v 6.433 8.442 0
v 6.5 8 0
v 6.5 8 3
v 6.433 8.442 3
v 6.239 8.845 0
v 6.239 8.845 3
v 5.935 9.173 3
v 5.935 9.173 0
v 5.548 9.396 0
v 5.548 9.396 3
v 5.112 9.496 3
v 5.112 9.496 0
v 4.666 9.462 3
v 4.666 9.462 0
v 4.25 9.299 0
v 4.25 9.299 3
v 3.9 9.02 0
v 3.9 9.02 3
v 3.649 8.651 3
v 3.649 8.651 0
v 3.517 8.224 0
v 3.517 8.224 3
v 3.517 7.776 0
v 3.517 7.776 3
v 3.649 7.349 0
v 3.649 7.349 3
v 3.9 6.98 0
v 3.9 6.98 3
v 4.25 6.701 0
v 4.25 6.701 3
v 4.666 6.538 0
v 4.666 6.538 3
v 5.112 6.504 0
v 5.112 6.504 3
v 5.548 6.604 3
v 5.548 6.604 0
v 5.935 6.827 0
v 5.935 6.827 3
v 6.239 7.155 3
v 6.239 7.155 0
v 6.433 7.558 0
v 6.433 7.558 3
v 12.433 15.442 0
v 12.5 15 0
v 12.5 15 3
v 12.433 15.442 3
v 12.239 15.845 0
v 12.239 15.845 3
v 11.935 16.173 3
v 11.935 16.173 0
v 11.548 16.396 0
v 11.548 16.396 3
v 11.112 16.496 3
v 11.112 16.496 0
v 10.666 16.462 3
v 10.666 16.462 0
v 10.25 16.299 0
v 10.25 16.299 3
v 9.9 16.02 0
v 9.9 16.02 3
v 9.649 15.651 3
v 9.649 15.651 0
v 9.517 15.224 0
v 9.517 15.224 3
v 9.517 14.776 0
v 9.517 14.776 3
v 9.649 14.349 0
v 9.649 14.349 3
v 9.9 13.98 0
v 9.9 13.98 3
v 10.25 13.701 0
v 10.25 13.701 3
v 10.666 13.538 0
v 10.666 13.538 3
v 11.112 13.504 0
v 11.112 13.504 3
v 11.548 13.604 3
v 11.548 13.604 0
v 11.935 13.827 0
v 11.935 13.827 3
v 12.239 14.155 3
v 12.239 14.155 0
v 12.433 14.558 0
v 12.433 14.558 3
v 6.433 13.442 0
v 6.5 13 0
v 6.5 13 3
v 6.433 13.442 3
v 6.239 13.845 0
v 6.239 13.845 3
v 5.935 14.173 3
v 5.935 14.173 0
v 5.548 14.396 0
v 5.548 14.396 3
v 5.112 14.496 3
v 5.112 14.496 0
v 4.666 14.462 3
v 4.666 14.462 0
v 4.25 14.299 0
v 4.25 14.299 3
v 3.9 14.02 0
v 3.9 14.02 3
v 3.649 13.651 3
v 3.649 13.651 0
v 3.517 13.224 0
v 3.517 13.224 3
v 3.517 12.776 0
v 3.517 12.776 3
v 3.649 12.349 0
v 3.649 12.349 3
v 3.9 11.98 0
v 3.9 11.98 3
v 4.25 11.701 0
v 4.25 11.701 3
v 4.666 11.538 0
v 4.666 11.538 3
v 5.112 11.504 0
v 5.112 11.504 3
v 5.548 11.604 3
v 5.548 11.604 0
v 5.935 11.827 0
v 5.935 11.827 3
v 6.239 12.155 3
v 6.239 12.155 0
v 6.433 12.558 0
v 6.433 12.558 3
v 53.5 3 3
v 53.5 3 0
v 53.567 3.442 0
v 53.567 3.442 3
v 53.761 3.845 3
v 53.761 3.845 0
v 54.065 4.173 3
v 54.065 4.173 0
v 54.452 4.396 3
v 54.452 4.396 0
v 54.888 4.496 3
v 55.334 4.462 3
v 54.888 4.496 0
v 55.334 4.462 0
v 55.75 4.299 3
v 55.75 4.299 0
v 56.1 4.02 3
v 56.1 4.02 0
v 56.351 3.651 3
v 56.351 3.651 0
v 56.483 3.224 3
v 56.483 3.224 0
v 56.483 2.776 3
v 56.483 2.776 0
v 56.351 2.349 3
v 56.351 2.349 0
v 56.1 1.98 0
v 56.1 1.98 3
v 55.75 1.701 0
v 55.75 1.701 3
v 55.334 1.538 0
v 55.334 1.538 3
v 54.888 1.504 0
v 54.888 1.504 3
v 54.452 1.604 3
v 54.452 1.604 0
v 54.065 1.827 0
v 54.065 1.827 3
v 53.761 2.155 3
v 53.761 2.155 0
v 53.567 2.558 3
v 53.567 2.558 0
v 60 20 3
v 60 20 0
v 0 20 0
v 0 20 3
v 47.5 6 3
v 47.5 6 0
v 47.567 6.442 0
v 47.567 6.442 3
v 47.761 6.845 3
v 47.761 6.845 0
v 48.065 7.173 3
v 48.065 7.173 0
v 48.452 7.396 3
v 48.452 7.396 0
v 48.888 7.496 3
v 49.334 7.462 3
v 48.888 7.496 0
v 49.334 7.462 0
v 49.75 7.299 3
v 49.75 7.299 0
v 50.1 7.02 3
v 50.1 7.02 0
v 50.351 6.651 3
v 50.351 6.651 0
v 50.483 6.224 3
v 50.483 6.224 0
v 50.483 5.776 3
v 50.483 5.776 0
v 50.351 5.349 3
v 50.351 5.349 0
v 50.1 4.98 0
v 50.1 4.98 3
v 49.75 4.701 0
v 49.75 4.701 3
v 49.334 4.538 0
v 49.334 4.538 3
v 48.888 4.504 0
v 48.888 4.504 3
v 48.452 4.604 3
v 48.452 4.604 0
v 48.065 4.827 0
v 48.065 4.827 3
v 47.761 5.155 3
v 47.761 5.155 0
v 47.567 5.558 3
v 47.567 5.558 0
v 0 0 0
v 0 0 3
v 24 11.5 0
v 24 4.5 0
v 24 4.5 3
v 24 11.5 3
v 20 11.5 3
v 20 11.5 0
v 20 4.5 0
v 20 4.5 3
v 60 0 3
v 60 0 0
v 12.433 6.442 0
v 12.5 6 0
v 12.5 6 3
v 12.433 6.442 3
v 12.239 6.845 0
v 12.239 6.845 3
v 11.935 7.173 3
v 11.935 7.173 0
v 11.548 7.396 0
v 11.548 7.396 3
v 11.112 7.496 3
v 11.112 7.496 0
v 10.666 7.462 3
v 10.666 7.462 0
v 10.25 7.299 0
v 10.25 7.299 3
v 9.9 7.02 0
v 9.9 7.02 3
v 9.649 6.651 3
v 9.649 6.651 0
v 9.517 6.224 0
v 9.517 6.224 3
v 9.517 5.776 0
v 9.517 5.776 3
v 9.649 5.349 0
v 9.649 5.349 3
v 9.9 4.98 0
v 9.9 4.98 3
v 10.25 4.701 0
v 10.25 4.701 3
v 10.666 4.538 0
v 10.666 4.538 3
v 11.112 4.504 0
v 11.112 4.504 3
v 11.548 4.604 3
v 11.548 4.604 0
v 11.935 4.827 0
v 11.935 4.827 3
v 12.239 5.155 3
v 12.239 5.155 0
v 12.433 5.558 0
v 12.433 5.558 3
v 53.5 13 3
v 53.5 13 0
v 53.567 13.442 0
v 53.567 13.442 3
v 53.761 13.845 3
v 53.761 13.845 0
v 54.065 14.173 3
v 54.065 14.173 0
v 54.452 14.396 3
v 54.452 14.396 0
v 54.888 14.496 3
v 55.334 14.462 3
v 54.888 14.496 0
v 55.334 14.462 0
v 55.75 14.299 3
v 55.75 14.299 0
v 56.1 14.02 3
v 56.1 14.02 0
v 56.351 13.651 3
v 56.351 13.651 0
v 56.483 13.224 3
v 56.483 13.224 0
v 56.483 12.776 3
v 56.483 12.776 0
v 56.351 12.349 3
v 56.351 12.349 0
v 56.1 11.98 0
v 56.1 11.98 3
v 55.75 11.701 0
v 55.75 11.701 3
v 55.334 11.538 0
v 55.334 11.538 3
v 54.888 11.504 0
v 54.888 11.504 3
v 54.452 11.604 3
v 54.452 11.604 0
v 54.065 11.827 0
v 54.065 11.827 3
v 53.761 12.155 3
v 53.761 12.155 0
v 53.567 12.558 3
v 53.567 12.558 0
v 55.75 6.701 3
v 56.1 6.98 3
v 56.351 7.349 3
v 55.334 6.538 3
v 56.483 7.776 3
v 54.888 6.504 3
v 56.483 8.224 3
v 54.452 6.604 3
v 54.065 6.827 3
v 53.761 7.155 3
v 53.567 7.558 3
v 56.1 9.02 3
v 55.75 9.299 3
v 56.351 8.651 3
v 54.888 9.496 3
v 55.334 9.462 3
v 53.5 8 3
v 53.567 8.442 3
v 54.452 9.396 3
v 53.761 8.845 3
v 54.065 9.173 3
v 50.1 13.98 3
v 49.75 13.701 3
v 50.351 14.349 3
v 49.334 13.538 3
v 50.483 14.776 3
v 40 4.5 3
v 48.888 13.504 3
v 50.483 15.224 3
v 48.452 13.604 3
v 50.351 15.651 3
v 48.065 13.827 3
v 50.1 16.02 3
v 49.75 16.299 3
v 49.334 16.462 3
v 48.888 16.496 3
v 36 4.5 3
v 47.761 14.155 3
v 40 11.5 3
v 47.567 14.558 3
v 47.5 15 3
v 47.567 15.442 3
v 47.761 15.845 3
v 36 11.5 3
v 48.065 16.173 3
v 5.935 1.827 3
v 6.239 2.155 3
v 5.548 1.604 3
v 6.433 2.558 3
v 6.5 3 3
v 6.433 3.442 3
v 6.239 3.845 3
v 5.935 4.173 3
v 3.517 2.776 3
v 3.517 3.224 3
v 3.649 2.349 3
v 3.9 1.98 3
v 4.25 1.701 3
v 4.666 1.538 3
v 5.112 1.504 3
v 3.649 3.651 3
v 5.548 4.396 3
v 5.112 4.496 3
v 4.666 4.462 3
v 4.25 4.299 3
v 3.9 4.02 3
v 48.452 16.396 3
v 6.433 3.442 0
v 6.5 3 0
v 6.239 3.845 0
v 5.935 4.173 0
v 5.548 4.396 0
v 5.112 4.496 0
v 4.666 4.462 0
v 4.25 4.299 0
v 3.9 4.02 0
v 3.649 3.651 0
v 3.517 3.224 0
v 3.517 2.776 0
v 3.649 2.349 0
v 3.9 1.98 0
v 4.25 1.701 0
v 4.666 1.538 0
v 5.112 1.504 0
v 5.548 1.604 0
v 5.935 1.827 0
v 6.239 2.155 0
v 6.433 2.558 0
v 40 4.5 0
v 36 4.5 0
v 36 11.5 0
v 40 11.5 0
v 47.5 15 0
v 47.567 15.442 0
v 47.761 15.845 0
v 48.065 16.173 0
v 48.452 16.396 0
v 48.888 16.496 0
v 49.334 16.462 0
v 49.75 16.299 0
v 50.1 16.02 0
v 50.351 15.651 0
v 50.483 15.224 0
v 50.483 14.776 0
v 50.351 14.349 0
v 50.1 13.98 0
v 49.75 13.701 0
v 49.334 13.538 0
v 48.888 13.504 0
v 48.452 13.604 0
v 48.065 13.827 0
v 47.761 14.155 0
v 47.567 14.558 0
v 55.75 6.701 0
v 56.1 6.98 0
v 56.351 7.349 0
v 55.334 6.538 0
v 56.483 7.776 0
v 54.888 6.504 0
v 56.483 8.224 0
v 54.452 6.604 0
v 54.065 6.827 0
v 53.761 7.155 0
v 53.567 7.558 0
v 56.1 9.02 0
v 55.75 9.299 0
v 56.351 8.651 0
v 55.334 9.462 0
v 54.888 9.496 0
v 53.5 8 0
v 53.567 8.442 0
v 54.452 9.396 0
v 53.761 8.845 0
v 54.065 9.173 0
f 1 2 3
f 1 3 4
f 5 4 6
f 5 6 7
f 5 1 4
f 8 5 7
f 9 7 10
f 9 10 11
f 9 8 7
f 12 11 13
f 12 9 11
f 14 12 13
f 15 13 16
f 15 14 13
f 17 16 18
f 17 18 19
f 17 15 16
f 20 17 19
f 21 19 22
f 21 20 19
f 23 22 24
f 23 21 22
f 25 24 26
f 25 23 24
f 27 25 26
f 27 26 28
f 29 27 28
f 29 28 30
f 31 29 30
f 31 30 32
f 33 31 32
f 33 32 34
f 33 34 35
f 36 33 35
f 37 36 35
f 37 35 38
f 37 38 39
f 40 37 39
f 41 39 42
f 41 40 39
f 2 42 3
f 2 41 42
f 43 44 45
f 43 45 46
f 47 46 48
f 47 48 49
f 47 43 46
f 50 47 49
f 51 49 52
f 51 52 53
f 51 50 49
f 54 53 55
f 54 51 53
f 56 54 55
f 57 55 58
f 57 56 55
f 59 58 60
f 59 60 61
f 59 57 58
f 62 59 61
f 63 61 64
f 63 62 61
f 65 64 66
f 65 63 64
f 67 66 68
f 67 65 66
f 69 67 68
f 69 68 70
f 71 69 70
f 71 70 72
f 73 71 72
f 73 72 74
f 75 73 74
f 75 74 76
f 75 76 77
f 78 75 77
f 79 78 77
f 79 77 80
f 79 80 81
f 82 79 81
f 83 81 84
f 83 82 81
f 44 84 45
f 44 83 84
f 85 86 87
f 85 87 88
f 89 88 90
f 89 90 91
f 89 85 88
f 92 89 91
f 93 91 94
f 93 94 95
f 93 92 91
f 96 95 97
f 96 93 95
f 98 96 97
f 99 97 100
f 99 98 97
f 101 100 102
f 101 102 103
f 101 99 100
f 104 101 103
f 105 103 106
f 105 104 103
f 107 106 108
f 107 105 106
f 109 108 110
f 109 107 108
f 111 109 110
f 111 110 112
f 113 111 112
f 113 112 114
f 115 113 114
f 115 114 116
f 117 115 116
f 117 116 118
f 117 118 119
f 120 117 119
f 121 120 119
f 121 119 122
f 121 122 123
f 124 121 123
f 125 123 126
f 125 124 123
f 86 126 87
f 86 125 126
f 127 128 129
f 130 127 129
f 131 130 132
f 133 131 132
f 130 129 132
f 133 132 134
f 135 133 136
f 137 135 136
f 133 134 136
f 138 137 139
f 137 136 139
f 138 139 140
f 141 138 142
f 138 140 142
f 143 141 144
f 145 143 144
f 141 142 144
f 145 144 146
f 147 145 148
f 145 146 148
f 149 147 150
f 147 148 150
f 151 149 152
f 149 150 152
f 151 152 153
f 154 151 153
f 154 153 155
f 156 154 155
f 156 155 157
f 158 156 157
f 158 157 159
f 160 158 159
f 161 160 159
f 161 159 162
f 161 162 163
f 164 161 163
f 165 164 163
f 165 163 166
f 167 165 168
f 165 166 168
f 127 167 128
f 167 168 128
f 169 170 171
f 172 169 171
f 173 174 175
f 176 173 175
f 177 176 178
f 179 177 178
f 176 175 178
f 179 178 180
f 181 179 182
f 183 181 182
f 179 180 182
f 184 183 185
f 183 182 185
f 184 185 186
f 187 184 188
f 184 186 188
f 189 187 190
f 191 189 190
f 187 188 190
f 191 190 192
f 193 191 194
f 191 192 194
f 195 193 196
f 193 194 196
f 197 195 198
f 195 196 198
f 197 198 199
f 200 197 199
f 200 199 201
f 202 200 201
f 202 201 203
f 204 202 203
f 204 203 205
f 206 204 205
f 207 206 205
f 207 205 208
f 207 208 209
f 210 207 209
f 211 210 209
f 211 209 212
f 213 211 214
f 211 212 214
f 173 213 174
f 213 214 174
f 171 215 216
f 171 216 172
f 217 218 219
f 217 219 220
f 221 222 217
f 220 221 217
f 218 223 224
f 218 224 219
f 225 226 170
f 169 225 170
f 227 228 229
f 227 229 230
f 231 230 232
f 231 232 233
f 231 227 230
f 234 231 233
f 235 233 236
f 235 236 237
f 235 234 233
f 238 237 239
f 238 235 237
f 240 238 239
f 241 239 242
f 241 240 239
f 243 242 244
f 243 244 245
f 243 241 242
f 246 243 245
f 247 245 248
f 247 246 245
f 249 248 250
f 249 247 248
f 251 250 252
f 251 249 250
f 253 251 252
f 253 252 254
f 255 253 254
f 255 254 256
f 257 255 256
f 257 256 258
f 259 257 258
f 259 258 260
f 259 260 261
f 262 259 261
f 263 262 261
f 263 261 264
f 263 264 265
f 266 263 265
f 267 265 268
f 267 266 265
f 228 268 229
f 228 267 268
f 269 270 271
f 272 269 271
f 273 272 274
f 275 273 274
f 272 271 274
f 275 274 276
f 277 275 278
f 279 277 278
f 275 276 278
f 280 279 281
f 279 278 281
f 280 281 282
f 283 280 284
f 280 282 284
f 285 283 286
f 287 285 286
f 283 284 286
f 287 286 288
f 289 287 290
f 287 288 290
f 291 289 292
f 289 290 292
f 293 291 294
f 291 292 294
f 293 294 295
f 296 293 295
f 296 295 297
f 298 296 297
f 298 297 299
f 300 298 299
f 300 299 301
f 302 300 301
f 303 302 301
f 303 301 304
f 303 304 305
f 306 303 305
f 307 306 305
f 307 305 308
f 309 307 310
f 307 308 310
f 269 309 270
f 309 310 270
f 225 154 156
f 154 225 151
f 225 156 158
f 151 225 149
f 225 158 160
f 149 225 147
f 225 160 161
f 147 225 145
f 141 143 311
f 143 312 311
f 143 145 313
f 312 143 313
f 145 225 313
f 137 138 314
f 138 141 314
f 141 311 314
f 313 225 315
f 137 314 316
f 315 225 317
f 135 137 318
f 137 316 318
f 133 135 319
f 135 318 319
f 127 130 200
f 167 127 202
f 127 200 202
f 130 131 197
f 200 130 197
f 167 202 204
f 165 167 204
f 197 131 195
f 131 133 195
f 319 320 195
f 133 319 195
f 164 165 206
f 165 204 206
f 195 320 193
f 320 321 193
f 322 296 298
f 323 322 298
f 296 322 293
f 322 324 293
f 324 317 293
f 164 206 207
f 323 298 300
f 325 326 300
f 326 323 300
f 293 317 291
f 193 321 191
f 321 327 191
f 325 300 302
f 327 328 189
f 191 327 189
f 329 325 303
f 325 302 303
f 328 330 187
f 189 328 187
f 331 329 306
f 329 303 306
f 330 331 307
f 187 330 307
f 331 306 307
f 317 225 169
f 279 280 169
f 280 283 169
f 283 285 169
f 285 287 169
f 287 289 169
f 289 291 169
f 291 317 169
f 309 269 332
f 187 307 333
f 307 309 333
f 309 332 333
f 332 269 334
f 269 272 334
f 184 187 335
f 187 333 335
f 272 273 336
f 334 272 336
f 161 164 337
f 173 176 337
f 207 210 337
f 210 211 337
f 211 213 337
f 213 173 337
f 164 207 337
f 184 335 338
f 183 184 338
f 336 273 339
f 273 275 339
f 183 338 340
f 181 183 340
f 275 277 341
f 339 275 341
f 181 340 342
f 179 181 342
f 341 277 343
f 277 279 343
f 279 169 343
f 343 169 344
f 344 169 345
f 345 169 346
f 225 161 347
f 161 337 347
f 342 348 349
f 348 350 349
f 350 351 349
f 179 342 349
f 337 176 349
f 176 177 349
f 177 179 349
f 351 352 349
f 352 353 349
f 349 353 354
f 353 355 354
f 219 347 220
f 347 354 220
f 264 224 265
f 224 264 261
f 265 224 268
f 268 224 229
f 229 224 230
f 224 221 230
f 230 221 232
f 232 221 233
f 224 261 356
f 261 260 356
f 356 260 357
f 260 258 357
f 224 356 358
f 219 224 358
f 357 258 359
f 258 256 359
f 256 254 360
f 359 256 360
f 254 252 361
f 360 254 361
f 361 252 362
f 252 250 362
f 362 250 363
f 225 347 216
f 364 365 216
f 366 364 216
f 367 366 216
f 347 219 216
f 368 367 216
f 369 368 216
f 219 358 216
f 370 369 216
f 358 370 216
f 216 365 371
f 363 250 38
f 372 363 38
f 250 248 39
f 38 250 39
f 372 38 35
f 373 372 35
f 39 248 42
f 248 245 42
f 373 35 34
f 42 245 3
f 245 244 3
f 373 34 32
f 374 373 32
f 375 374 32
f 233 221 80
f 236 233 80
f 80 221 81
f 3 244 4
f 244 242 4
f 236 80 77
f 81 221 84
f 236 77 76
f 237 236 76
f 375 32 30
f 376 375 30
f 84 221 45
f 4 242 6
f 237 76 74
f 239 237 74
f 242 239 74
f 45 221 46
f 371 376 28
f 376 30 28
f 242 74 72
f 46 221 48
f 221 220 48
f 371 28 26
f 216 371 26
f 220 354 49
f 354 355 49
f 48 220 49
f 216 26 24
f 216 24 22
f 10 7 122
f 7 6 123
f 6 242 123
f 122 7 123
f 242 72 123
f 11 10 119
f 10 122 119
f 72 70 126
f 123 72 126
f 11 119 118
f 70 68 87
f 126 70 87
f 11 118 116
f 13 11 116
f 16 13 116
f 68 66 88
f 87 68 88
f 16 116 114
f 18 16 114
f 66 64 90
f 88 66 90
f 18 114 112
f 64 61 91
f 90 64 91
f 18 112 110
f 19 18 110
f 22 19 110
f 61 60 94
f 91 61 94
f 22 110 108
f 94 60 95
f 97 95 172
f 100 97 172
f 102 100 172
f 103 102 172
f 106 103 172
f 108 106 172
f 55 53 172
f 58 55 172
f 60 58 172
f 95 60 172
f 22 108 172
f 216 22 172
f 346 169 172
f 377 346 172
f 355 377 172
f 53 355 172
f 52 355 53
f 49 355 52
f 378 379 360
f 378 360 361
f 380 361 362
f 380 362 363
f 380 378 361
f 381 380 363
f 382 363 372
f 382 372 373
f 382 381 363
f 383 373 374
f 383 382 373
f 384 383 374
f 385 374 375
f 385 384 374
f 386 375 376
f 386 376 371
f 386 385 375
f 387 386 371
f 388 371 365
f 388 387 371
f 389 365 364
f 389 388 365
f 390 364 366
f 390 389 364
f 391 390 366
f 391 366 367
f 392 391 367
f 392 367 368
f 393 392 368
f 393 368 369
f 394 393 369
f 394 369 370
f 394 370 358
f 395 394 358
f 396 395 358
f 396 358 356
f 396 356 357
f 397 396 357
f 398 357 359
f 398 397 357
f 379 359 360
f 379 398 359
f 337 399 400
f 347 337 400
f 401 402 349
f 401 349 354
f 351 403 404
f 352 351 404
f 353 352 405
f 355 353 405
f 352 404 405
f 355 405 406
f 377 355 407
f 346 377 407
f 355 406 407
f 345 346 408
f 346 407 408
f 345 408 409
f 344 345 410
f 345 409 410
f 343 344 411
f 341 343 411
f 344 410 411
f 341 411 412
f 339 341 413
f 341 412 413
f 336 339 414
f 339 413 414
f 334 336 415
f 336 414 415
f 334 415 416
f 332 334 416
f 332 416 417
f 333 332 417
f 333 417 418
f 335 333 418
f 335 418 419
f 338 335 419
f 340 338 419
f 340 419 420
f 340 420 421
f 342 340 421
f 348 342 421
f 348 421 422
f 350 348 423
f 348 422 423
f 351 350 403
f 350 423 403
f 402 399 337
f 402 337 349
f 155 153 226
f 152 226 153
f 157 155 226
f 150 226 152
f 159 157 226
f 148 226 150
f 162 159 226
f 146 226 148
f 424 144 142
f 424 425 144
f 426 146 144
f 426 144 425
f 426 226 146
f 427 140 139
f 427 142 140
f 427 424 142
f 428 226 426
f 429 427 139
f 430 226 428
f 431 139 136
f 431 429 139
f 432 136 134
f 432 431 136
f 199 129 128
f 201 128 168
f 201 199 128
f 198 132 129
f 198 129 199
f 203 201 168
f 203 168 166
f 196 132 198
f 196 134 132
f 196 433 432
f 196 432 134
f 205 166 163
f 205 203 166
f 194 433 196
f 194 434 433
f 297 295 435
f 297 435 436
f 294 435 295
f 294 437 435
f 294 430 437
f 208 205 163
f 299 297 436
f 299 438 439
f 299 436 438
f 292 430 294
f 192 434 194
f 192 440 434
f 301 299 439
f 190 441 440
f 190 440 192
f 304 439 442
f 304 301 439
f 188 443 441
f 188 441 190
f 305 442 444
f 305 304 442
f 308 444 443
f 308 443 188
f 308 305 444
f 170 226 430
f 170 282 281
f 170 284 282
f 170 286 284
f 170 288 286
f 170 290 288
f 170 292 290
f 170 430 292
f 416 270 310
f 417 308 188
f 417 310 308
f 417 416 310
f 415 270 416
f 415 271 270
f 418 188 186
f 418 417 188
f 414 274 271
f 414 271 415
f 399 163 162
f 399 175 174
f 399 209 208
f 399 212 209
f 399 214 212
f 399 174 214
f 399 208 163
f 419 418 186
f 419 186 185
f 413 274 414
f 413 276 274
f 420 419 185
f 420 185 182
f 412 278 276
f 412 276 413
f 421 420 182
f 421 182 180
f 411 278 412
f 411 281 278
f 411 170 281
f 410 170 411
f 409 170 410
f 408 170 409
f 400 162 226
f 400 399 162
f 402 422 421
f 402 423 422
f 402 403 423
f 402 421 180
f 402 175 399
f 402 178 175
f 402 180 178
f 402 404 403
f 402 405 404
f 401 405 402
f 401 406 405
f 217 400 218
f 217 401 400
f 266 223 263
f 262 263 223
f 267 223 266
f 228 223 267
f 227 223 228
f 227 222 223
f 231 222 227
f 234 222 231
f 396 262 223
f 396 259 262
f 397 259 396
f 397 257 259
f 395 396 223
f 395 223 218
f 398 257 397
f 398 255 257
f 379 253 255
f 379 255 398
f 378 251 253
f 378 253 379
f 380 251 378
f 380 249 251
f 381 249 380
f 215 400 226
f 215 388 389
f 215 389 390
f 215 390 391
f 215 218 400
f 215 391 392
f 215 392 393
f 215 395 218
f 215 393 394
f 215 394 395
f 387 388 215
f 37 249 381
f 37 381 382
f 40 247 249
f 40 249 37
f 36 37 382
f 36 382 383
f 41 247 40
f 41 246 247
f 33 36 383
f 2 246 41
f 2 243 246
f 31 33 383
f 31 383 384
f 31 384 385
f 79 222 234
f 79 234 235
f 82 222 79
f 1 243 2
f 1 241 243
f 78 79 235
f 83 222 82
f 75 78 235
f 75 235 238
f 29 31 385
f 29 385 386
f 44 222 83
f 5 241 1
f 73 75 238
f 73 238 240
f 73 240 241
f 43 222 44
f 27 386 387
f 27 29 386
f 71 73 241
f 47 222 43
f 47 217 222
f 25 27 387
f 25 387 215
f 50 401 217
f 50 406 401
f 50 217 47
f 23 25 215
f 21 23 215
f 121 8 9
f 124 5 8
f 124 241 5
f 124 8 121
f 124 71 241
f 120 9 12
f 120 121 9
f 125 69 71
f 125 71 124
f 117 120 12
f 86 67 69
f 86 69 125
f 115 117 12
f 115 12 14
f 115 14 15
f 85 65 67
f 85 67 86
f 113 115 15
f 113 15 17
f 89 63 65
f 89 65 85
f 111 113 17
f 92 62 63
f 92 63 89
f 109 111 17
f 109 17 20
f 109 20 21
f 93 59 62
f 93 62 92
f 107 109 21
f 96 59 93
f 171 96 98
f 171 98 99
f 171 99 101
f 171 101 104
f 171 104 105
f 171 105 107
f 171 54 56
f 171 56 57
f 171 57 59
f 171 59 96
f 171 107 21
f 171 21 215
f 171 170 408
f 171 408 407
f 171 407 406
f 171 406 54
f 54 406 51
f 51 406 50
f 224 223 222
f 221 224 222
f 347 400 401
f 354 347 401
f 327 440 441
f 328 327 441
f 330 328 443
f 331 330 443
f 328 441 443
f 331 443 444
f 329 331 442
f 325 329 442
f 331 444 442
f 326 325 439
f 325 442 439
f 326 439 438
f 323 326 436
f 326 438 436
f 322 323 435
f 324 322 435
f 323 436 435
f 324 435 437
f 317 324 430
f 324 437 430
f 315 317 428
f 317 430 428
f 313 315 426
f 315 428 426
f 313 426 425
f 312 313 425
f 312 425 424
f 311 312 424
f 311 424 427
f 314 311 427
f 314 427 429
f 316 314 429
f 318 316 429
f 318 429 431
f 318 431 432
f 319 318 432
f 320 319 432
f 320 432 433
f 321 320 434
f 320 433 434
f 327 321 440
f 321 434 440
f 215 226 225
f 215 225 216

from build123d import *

# Parameters (mm, degrees)
SKETCH_W   = 30
SKETCH_H   = 20
SKETCH_R   = 1.5
SKETCH_W_2 = 4
SKETCH_H_2 = 7
PAD_DEPTH  = 3


with BuildPart() as part:
    # Sketch → Pad (new body)
    with BuildSketch(Plane.XY):
        with Locations((15, 10)):
            Rectangle(SKETCH_W, SKETCH_H)
        with Locations((5, 8)):
            Circle(SKETCH_R, mode=Mode.SUBTRACT)
        with Locations((11, 15)):
            Circle(SKETCH_R, mode=Mode.SUBTRACT)
        with Locations((11, 6)):
            Circle(SKETCH_R, mode=Mode.SUBTRACT)
        with Locations((5, 13)):
            Circle(SKETCH_R, mode=Mode.SUBTRACT)
        with Locations((5, 3)):
            Circle(SKETCH_R, mode=Mode.SUBTRACT)
        with Locations((22, 8)):
            Rectangle(SKETCH_W_2, SKETCH_H_2, mode=Mode.SUBTRACT)
    pad = extrude(amount=PAD_DEPTH)

    # Mirrored: Pad across face of Pad
    add(pad.mirror(Plane(origin=(30, 10, 1.5), x_dir=(0, 1, 0), z_dir=(1, 0, 0))))


solid = part.part
